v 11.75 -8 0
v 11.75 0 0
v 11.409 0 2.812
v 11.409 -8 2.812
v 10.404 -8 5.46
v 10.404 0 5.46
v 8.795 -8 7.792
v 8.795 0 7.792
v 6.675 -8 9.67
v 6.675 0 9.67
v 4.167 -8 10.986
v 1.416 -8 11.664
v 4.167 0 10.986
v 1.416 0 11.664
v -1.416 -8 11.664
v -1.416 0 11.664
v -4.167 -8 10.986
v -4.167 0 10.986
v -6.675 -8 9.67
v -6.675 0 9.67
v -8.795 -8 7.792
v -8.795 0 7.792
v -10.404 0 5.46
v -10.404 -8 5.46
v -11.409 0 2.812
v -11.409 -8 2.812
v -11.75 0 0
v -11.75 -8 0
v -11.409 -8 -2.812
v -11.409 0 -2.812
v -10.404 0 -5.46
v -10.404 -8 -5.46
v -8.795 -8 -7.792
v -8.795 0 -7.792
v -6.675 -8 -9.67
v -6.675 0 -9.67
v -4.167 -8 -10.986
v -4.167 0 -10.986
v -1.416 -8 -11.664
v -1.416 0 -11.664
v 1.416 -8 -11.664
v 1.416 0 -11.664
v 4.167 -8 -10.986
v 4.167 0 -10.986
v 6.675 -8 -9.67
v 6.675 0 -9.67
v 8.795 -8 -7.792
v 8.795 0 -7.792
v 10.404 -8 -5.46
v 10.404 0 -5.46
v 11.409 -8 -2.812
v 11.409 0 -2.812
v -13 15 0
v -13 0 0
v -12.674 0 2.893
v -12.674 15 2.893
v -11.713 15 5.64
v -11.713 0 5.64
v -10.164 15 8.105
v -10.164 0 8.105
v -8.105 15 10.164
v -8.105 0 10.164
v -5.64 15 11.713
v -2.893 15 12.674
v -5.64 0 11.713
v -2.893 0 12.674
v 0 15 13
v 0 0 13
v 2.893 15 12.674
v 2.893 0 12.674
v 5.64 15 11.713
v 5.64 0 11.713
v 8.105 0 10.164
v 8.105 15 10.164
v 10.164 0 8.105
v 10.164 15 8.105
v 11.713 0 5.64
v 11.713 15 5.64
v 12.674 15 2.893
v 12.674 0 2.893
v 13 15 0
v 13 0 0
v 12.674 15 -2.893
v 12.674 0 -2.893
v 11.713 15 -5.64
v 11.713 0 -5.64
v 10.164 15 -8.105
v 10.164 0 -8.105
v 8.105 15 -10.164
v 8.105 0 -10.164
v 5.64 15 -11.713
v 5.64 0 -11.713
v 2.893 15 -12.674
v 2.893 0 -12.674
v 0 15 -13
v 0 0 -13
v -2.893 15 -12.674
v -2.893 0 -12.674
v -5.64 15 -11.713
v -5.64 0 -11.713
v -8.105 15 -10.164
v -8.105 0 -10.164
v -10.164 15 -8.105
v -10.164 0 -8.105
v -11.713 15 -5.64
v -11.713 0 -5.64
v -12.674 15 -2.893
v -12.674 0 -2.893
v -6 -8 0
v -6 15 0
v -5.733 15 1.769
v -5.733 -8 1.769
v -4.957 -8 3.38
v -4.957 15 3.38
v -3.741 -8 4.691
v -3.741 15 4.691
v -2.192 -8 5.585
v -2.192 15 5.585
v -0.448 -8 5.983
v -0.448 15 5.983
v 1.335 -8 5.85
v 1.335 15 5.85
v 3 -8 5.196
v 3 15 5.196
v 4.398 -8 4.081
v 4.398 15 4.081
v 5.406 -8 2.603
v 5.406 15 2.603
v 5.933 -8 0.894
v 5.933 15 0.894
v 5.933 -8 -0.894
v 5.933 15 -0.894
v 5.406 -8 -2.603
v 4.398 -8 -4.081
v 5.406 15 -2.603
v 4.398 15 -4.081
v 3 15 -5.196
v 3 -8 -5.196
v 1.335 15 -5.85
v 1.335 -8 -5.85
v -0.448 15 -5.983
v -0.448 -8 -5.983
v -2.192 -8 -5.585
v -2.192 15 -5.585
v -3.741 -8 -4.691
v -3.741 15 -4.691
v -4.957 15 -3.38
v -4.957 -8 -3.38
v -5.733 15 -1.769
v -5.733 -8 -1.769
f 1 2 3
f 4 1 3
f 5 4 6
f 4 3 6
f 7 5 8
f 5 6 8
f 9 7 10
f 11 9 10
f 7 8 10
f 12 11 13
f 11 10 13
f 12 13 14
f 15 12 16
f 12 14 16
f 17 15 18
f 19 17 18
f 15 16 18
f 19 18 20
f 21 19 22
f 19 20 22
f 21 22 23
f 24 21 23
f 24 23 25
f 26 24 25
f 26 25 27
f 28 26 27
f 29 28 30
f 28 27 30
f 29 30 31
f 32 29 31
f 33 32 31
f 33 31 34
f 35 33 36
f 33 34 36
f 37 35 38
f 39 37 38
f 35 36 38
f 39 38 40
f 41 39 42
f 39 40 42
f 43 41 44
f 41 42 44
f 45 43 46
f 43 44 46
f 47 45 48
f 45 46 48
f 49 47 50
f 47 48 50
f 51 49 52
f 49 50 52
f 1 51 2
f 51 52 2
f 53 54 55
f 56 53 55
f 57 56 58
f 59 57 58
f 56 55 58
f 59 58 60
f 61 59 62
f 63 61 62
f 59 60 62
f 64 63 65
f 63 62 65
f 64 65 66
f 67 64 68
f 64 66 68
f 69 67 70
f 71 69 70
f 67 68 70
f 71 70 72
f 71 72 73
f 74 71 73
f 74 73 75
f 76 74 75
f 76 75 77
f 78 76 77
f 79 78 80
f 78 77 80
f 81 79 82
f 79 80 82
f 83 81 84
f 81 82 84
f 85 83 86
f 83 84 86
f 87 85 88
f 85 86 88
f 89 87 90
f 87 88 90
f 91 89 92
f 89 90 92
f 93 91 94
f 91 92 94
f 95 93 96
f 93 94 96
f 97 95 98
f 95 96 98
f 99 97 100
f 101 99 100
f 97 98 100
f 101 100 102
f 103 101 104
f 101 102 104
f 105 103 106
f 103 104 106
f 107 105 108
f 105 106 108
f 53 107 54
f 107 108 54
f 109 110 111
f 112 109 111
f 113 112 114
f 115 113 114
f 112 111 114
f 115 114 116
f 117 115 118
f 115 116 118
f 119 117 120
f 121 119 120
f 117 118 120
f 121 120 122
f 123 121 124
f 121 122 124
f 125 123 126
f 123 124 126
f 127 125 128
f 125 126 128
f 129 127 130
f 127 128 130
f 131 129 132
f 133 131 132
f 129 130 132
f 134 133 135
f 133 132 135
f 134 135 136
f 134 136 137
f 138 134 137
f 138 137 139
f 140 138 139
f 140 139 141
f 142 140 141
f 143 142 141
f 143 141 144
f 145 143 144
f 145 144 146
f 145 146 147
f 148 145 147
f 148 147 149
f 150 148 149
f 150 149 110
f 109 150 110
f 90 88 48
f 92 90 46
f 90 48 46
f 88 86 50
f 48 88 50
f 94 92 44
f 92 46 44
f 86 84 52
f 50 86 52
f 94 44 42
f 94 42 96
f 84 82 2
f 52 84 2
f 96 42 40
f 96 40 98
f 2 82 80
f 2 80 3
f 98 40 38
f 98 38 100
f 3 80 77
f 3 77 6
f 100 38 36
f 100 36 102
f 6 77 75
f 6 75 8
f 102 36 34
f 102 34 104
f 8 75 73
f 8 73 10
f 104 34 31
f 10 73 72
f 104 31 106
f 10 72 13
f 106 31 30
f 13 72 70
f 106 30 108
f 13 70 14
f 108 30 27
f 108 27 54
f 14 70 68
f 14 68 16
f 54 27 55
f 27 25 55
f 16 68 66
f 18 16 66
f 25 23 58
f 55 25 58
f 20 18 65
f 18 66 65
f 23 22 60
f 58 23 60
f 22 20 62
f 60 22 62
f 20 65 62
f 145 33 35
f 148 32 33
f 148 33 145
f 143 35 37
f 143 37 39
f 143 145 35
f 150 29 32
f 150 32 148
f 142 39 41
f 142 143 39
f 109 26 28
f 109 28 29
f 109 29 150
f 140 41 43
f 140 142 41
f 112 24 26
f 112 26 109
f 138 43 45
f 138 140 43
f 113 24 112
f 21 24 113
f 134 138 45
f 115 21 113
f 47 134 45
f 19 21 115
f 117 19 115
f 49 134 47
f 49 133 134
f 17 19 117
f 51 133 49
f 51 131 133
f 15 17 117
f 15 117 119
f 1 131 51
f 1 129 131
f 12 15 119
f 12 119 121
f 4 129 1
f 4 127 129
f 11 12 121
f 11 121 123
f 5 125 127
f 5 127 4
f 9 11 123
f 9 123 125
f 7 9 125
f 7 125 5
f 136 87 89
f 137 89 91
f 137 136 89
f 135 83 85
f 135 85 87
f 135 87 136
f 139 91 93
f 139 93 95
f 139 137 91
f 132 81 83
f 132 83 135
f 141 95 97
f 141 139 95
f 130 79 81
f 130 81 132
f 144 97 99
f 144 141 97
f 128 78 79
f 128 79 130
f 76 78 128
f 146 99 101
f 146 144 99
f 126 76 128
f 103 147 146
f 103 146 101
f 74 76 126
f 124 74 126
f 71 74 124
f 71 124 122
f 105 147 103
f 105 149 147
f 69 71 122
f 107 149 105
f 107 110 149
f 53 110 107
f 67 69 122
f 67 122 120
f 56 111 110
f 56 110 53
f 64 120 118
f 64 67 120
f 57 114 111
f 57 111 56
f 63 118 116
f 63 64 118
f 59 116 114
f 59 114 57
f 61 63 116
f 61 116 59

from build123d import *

# Parameters (mm, degrees)
F0_R     = 11.75
F1_DEPTH = 8
F2_R     = 13
F3_DEPTH = 15
F4_R     = 6
F5_DEPTH = 25


with BuildPart() as f1:
    # F0 (on Front) → F1 (new body)
    with BuildSketch(Plane.XZ):
        Circle(F0_R)
    extrude(amount=F1_DEPTH)

    # F2 (on face) → F3 (join)
    with BuildSketch(Plane(origin=(0, 0, 0), x_dir=(-1, 0, 0), z_dir=(0, 1, 0))):
        Circle(F2_R)
    extrude(amount=F3_DEPTH)

    # F4 (on face) → F5 (cut)
    with BuildSketch(Plane(origin=(0, 15, 0), x_dir=(-1, 0, 0), z_dir=(0, 1, 0))):
        Circle(F4_R)
    extrude(amount=-F5_DEPTH, mode=Mode.SUBTRACT)


solid = f1.part
